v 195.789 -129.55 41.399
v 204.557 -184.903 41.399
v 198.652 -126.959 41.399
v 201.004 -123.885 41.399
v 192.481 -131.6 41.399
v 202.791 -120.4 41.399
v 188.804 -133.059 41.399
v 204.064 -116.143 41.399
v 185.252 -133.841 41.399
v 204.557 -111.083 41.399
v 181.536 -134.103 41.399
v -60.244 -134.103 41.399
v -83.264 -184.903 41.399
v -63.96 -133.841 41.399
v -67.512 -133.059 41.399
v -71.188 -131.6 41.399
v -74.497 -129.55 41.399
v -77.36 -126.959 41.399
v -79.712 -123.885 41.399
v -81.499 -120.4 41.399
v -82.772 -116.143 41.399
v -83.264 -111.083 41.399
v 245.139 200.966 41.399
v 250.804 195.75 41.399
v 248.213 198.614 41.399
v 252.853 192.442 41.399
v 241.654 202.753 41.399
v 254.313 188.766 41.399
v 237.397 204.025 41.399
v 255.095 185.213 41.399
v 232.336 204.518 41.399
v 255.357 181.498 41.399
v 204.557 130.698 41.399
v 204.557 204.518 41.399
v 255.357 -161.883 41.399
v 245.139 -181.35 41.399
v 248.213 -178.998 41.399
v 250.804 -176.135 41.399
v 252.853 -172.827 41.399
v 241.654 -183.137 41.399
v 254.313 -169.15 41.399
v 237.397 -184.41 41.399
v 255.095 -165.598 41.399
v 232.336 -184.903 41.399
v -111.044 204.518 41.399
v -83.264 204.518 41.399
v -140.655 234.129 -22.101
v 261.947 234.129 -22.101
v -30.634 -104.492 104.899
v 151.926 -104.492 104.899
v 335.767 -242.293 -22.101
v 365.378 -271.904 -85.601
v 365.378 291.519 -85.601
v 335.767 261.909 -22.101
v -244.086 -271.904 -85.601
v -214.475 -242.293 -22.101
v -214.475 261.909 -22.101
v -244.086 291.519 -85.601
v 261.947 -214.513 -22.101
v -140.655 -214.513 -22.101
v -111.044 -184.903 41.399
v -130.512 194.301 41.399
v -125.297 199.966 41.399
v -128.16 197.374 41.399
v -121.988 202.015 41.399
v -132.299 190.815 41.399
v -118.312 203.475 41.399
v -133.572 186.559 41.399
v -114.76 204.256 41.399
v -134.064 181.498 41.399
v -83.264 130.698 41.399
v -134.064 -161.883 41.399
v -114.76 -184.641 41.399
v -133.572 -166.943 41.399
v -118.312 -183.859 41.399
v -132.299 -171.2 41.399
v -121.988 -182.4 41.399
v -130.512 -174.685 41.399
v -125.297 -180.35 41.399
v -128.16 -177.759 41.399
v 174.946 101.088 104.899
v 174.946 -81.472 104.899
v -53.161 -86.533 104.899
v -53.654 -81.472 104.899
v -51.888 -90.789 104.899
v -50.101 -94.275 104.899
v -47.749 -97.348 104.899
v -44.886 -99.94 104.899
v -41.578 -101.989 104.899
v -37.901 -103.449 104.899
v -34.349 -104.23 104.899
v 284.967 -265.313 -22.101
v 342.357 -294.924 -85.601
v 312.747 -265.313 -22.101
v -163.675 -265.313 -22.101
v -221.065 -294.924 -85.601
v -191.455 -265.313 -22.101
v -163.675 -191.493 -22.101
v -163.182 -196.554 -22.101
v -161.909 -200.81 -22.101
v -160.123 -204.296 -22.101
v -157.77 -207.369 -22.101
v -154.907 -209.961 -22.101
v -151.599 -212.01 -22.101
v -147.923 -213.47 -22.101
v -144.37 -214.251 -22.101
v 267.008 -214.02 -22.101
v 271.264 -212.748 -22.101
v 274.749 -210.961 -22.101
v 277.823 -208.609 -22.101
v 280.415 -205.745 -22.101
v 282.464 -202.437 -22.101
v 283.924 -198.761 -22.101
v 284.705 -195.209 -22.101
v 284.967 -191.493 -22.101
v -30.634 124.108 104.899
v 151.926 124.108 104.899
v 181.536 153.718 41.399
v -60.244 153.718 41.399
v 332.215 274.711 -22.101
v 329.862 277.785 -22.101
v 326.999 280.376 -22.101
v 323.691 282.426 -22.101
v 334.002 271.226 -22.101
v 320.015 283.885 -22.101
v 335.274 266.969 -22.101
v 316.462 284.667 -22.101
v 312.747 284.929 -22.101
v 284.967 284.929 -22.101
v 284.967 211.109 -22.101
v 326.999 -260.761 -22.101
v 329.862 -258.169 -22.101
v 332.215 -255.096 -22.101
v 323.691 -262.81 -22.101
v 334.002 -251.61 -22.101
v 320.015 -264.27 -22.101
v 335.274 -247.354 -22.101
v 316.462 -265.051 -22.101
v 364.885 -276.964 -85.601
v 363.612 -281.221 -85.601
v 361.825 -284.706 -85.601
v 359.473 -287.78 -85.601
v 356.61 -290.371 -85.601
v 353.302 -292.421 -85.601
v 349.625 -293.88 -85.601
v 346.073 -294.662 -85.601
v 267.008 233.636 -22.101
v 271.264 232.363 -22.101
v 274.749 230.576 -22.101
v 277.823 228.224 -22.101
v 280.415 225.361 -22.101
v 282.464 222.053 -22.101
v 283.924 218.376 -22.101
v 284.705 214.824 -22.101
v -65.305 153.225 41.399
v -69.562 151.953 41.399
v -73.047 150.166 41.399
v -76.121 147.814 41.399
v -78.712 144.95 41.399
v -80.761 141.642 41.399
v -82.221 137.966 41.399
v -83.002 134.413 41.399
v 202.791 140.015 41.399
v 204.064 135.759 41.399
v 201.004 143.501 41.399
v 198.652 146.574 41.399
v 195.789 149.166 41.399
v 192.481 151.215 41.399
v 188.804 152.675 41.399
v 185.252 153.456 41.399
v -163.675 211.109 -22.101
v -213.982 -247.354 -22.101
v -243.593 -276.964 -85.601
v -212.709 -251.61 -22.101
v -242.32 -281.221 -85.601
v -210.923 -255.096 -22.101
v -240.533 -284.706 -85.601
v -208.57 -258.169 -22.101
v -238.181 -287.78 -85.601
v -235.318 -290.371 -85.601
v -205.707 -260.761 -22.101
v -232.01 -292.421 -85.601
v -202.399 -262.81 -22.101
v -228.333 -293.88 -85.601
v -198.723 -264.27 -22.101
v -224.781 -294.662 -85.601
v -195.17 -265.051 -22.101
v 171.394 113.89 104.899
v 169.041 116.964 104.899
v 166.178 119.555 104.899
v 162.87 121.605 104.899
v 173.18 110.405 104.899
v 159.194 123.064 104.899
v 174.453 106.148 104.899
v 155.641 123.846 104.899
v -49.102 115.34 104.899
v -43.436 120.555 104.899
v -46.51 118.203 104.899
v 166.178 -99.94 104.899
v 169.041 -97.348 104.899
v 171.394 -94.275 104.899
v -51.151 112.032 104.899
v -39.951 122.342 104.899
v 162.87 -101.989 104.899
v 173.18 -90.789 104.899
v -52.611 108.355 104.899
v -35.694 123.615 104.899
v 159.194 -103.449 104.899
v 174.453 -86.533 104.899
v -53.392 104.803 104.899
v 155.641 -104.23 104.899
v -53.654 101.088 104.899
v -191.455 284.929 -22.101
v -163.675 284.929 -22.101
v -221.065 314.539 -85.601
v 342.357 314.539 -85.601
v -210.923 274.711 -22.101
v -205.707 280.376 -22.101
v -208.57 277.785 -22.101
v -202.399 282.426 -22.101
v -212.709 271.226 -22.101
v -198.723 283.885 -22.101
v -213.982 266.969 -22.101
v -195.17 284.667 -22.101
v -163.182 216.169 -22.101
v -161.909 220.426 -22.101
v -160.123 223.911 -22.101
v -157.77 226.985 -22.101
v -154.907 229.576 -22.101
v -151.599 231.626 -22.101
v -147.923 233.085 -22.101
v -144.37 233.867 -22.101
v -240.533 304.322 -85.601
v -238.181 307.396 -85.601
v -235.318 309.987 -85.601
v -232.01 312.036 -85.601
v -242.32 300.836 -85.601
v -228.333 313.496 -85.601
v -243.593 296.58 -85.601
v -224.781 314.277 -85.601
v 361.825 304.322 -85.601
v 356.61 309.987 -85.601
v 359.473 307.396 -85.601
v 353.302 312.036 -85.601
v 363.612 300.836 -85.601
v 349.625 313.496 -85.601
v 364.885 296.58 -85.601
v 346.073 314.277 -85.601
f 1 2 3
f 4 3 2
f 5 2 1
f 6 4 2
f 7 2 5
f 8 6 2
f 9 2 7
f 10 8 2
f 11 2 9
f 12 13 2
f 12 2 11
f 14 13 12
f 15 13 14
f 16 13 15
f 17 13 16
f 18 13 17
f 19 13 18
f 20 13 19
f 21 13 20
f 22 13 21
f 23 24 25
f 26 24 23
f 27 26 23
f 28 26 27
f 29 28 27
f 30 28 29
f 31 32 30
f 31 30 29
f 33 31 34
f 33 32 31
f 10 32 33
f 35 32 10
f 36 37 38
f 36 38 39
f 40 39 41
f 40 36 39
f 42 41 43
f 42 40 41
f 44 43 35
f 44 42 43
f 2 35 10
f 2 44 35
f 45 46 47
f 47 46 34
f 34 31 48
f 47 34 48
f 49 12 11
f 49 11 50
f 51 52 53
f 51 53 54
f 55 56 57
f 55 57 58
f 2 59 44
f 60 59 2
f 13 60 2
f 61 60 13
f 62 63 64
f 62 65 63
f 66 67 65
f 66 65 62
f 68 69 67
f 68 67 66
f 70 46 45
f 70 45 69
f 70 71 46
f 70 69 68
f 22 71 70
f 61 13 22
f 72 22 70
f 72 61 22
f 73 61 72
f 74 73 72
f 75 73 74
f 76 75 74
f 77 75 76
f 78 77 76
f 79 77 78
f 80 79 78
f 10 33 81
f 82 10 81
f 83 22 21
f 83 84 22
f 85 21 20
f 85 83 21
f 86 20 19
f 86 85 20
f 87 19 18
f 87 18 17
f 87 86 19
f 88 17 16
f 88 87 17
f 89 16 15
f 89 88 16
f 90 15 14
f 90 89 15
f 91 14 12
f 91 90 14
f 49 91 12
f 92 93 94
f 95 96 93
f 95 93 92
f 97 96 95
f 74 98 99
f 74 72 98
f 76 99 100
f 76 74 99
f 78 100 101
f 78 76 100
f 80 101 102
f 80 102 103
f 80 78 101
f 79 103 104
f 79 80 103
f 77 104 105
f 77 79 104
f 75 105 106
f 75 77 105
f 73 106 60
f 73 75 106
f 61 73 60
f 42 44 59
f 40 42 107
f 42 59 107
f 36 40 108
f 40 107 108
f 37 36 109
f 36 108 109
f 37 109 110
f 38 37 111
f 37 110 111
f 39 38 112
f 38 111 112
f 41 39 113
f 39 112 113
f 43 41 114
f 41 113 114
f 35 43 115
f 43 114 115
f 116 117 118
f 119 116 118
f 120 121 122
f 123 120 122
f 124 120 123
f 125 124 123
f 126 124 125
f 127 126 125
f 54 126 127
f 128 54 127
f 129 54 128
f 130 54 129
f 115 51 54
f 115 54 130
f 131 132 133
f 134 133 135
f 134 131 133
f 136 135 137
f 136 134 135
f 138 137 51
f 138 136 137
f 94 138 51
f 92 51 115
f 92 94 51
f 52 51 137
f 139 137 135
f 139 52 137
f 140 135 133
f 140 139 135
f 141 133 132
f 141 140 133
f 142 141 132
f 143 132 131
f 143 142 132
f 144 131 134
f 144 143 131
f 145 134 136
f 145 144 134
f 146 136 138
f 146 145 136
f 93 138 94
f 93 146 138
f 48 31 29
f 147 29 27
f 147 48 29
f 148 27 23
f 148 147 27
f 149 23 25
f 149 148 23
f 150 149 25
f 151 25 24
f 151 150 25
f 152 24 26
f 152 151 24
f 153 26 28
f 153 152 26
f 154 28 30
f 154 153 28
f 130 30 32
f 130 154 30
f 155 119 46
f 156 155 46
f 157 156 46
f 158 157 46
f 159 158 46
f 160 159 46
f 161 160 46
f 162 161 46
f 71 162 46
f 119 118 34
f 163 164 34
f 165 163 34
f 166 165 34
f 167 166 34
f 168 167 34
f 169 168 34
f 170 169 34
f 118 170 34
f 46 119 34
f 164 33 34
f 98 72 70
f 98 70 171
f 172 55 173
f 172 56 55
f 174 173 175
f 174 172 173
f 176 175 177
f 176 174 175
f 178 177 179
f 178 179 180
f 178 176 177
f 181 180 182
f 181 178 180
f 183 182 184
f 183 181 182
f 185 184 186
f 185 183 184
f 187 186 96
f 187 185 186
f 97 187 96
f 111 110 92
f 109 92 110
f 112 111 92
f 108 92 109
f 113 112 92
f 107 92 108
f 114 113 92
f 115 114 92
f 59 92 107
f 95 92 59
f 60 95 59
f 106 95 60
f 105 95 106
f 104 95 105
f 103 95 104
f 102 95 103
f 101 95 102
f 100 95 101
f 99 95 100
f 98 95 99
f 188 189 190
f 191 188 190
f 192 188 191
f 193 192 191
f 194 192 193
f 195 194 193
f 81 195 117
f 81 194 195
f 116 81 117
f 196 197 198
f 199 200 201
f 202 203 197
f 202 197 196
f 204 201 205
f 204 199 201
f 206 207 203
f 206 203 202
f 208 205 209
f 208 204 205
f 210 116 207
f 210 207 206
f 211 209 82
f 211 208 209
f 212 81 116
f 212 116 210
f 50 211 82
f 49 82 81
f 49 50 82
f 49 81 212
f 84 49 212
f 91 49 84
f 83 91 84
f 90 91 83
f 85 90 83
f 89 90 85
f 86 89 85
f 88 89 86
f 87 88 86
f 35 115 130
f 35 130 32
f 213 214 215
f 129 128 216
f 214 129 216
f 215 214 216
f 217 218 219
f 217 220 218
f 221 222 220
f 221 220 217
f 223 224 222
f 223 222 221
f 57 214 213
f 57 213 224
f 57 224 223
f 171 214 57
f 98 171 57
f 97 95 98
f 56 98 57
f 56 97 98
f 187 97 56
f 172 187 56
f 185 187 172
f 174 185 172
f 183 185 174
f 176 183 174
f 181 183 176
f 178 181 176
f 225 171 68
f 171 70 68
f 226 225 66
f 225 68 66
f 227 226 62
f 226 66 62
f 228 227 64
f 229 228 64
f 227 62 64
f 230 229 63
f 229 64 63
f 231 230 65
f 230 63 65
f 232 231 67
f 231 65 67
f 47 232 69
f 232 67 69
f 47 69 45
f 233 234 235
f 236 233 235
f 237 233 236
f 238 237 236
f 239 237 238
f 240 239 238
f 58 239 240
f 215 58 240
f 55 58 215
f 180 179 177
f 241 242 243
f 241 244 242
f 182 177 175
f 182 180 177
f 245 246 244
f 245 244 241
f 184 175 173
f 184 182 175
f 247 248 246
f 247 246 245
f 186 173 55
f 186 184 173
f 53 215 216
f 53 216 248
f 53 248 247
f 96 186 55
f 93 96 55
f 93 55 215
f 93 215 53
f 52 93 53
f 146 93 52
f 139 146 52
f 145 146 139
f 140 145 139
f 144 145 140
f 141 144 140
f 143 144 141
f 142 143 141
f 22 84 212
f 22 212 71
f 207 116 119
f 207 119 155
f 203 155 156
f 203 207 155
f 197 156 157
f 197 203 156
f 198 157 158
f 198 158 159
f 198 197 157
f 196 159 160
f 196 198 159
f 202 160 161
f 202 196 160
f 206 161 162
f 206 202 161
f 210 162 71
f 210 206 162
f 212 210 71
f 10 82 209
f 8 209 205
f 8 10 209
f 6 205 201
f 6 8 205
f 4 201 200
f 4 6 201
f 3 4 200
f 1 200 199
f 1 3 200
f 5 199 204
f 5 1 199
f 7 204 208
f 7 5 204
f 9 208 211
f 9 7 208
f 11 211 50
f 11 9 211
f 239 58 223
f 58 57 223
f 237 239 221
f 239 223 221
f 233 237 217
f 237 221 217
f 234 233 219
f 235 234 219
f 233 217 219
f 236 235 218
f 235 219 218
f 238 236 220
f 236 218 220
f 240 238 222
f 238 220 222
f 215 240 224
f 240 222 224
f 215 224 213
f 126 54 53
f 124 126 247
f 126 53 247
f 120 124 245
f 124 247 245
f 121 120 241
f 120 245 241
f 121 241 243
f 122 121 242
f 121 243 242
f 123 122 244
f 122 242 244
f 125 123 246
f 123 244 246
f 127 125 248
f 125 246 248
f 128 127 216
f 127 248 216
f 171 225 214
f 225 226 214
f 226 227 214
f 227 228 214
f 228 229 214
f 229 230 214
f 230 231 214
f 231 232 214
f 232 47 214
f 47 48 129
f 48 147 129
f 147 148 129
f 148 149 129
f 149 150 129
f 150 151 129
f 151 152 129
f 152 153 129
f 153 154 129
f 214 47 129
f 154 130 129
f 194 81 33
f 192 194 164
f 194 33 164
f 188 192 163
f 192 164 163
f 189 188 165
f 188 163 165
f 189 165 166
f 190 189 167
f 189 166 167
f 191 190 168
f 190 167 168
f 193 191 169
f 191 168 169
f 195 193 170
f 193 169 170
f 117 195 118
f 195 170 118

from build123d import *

# Parameters (mm, degrees)
F1_DEPTH = 487.68
F3_DEPTH = 543.56
F4_R     = 25.4


# Not quite as in the source:
# - ends of sketch curves that miss each other by under 0.0002 mm in the source are joined


with BuildPart() as f1:
    # F0 (on Front) → F1 (new body, symmetric)
    with BuildSketch(Plane.XZ):
        Polygon((-83.2644920098, 41.3985210439), (60.6460442831, 41.3985210439), (60.6460442831, 104.8985210439), (-53.6539557169, 104.8985210439), align=None)
        Polygon((60.6460442831, 104.8985210439), (60.6460442831, 41.3985210439), (204.5565805759, 41.3985210439), (174.9460442831, 104.8985210439), align=None)
        Polygon((60.6460442831, 41.3985210439), (60.6460442831, -22.1014789561), (284.9671168688, -22.1014789561), (255.3565805759, 41.3985210439), (204.5565805759, 41.3985210439), align=None)
        Polygon((-163.6750283026, -22.1014789561), (60.6460442831, -22.1014789561), (60.6460442831, 41.3985210439), (-83.2644920098, 41.3985210439), (-134.0644920098, 41.3985210439), align=None)
        Polygon((-244.0855645955, -85.6014789561), (60.6460442831, -85.6014789561), (60.6460442831, -22.1014789561), (-163.6750283026, -22.1014789561), (-214.4750283026, -22.1014789561), align=None)
        Polygon((60.6460442831, -22.1014789561), (60.6460442831, -85.6014789561), (365.3776531616, -85.6014789561), (335.7671168688, -22.1014789561), (284.9671168688, -22.1014789561), align=None)
    extrude(amount=F1_DEPTH, both=True)

    # F2 (on Right) → F3 (cut, symmetric)
    with BuildSketch(Plane.YZ):
        Polygon((-396.5238630772, -85.6014788151), (-294.9238630772, -85.6014788151), (-265.3133267843, -22.1014788151), (-214.5133267843, -22.1014788151), (-184.9027904915, 41.3985211849), (-134.1027904915, 41.3985211849), (-104.4922541986, 104.8985211849), (-180.6922541986, 104.8985211849), (-487.68, 104.8985210439), (-487.68, -85.6014789561), align=None)
        Polygon((284.928818387, -22.1014788151), (314.5393546799, -85.6014788151), (487.68, -85.6014789561), (487.68, 104.8985210439), (124.1077458014, 104.8985210439), (153.7182820942, 41.3985211849), (204.5182820942, 41.3985211849), (234.128818387, -22.1014788151), align=None)
    extrude(amount=F3_DEPTH, both=True, mode=Mode.SUBTRACT)

    # F4
    f4_edges = [f1.edges().sort_by_distance(p)[0] for p in [
        (-68.459224, 138.913014, 73.148521),
        (-148.86976, 219.32355, 9.648521),
        (-229.280296, 299.734087, -53.851479),
        (350.572385, 299.734087, -53.851479),
        (270.161849, 219.32355, 9.648521),
        (189.751312, 138.913014, 73.148521),
        (350.572385, -280.118595, -53.851479),
        (270.161849, -199.708059, 9.648521),
        (189.751312, -119.297522, 73.148521),
        (-229.280296, -280.118595, -53.851479),
        (-148.86976, -199.708059, 9.648521),
        (-68.459224, -119.297522, 73.148521),
    ]]
    fillet(f4_edges, radius=F4_R)


solid = f1.part
